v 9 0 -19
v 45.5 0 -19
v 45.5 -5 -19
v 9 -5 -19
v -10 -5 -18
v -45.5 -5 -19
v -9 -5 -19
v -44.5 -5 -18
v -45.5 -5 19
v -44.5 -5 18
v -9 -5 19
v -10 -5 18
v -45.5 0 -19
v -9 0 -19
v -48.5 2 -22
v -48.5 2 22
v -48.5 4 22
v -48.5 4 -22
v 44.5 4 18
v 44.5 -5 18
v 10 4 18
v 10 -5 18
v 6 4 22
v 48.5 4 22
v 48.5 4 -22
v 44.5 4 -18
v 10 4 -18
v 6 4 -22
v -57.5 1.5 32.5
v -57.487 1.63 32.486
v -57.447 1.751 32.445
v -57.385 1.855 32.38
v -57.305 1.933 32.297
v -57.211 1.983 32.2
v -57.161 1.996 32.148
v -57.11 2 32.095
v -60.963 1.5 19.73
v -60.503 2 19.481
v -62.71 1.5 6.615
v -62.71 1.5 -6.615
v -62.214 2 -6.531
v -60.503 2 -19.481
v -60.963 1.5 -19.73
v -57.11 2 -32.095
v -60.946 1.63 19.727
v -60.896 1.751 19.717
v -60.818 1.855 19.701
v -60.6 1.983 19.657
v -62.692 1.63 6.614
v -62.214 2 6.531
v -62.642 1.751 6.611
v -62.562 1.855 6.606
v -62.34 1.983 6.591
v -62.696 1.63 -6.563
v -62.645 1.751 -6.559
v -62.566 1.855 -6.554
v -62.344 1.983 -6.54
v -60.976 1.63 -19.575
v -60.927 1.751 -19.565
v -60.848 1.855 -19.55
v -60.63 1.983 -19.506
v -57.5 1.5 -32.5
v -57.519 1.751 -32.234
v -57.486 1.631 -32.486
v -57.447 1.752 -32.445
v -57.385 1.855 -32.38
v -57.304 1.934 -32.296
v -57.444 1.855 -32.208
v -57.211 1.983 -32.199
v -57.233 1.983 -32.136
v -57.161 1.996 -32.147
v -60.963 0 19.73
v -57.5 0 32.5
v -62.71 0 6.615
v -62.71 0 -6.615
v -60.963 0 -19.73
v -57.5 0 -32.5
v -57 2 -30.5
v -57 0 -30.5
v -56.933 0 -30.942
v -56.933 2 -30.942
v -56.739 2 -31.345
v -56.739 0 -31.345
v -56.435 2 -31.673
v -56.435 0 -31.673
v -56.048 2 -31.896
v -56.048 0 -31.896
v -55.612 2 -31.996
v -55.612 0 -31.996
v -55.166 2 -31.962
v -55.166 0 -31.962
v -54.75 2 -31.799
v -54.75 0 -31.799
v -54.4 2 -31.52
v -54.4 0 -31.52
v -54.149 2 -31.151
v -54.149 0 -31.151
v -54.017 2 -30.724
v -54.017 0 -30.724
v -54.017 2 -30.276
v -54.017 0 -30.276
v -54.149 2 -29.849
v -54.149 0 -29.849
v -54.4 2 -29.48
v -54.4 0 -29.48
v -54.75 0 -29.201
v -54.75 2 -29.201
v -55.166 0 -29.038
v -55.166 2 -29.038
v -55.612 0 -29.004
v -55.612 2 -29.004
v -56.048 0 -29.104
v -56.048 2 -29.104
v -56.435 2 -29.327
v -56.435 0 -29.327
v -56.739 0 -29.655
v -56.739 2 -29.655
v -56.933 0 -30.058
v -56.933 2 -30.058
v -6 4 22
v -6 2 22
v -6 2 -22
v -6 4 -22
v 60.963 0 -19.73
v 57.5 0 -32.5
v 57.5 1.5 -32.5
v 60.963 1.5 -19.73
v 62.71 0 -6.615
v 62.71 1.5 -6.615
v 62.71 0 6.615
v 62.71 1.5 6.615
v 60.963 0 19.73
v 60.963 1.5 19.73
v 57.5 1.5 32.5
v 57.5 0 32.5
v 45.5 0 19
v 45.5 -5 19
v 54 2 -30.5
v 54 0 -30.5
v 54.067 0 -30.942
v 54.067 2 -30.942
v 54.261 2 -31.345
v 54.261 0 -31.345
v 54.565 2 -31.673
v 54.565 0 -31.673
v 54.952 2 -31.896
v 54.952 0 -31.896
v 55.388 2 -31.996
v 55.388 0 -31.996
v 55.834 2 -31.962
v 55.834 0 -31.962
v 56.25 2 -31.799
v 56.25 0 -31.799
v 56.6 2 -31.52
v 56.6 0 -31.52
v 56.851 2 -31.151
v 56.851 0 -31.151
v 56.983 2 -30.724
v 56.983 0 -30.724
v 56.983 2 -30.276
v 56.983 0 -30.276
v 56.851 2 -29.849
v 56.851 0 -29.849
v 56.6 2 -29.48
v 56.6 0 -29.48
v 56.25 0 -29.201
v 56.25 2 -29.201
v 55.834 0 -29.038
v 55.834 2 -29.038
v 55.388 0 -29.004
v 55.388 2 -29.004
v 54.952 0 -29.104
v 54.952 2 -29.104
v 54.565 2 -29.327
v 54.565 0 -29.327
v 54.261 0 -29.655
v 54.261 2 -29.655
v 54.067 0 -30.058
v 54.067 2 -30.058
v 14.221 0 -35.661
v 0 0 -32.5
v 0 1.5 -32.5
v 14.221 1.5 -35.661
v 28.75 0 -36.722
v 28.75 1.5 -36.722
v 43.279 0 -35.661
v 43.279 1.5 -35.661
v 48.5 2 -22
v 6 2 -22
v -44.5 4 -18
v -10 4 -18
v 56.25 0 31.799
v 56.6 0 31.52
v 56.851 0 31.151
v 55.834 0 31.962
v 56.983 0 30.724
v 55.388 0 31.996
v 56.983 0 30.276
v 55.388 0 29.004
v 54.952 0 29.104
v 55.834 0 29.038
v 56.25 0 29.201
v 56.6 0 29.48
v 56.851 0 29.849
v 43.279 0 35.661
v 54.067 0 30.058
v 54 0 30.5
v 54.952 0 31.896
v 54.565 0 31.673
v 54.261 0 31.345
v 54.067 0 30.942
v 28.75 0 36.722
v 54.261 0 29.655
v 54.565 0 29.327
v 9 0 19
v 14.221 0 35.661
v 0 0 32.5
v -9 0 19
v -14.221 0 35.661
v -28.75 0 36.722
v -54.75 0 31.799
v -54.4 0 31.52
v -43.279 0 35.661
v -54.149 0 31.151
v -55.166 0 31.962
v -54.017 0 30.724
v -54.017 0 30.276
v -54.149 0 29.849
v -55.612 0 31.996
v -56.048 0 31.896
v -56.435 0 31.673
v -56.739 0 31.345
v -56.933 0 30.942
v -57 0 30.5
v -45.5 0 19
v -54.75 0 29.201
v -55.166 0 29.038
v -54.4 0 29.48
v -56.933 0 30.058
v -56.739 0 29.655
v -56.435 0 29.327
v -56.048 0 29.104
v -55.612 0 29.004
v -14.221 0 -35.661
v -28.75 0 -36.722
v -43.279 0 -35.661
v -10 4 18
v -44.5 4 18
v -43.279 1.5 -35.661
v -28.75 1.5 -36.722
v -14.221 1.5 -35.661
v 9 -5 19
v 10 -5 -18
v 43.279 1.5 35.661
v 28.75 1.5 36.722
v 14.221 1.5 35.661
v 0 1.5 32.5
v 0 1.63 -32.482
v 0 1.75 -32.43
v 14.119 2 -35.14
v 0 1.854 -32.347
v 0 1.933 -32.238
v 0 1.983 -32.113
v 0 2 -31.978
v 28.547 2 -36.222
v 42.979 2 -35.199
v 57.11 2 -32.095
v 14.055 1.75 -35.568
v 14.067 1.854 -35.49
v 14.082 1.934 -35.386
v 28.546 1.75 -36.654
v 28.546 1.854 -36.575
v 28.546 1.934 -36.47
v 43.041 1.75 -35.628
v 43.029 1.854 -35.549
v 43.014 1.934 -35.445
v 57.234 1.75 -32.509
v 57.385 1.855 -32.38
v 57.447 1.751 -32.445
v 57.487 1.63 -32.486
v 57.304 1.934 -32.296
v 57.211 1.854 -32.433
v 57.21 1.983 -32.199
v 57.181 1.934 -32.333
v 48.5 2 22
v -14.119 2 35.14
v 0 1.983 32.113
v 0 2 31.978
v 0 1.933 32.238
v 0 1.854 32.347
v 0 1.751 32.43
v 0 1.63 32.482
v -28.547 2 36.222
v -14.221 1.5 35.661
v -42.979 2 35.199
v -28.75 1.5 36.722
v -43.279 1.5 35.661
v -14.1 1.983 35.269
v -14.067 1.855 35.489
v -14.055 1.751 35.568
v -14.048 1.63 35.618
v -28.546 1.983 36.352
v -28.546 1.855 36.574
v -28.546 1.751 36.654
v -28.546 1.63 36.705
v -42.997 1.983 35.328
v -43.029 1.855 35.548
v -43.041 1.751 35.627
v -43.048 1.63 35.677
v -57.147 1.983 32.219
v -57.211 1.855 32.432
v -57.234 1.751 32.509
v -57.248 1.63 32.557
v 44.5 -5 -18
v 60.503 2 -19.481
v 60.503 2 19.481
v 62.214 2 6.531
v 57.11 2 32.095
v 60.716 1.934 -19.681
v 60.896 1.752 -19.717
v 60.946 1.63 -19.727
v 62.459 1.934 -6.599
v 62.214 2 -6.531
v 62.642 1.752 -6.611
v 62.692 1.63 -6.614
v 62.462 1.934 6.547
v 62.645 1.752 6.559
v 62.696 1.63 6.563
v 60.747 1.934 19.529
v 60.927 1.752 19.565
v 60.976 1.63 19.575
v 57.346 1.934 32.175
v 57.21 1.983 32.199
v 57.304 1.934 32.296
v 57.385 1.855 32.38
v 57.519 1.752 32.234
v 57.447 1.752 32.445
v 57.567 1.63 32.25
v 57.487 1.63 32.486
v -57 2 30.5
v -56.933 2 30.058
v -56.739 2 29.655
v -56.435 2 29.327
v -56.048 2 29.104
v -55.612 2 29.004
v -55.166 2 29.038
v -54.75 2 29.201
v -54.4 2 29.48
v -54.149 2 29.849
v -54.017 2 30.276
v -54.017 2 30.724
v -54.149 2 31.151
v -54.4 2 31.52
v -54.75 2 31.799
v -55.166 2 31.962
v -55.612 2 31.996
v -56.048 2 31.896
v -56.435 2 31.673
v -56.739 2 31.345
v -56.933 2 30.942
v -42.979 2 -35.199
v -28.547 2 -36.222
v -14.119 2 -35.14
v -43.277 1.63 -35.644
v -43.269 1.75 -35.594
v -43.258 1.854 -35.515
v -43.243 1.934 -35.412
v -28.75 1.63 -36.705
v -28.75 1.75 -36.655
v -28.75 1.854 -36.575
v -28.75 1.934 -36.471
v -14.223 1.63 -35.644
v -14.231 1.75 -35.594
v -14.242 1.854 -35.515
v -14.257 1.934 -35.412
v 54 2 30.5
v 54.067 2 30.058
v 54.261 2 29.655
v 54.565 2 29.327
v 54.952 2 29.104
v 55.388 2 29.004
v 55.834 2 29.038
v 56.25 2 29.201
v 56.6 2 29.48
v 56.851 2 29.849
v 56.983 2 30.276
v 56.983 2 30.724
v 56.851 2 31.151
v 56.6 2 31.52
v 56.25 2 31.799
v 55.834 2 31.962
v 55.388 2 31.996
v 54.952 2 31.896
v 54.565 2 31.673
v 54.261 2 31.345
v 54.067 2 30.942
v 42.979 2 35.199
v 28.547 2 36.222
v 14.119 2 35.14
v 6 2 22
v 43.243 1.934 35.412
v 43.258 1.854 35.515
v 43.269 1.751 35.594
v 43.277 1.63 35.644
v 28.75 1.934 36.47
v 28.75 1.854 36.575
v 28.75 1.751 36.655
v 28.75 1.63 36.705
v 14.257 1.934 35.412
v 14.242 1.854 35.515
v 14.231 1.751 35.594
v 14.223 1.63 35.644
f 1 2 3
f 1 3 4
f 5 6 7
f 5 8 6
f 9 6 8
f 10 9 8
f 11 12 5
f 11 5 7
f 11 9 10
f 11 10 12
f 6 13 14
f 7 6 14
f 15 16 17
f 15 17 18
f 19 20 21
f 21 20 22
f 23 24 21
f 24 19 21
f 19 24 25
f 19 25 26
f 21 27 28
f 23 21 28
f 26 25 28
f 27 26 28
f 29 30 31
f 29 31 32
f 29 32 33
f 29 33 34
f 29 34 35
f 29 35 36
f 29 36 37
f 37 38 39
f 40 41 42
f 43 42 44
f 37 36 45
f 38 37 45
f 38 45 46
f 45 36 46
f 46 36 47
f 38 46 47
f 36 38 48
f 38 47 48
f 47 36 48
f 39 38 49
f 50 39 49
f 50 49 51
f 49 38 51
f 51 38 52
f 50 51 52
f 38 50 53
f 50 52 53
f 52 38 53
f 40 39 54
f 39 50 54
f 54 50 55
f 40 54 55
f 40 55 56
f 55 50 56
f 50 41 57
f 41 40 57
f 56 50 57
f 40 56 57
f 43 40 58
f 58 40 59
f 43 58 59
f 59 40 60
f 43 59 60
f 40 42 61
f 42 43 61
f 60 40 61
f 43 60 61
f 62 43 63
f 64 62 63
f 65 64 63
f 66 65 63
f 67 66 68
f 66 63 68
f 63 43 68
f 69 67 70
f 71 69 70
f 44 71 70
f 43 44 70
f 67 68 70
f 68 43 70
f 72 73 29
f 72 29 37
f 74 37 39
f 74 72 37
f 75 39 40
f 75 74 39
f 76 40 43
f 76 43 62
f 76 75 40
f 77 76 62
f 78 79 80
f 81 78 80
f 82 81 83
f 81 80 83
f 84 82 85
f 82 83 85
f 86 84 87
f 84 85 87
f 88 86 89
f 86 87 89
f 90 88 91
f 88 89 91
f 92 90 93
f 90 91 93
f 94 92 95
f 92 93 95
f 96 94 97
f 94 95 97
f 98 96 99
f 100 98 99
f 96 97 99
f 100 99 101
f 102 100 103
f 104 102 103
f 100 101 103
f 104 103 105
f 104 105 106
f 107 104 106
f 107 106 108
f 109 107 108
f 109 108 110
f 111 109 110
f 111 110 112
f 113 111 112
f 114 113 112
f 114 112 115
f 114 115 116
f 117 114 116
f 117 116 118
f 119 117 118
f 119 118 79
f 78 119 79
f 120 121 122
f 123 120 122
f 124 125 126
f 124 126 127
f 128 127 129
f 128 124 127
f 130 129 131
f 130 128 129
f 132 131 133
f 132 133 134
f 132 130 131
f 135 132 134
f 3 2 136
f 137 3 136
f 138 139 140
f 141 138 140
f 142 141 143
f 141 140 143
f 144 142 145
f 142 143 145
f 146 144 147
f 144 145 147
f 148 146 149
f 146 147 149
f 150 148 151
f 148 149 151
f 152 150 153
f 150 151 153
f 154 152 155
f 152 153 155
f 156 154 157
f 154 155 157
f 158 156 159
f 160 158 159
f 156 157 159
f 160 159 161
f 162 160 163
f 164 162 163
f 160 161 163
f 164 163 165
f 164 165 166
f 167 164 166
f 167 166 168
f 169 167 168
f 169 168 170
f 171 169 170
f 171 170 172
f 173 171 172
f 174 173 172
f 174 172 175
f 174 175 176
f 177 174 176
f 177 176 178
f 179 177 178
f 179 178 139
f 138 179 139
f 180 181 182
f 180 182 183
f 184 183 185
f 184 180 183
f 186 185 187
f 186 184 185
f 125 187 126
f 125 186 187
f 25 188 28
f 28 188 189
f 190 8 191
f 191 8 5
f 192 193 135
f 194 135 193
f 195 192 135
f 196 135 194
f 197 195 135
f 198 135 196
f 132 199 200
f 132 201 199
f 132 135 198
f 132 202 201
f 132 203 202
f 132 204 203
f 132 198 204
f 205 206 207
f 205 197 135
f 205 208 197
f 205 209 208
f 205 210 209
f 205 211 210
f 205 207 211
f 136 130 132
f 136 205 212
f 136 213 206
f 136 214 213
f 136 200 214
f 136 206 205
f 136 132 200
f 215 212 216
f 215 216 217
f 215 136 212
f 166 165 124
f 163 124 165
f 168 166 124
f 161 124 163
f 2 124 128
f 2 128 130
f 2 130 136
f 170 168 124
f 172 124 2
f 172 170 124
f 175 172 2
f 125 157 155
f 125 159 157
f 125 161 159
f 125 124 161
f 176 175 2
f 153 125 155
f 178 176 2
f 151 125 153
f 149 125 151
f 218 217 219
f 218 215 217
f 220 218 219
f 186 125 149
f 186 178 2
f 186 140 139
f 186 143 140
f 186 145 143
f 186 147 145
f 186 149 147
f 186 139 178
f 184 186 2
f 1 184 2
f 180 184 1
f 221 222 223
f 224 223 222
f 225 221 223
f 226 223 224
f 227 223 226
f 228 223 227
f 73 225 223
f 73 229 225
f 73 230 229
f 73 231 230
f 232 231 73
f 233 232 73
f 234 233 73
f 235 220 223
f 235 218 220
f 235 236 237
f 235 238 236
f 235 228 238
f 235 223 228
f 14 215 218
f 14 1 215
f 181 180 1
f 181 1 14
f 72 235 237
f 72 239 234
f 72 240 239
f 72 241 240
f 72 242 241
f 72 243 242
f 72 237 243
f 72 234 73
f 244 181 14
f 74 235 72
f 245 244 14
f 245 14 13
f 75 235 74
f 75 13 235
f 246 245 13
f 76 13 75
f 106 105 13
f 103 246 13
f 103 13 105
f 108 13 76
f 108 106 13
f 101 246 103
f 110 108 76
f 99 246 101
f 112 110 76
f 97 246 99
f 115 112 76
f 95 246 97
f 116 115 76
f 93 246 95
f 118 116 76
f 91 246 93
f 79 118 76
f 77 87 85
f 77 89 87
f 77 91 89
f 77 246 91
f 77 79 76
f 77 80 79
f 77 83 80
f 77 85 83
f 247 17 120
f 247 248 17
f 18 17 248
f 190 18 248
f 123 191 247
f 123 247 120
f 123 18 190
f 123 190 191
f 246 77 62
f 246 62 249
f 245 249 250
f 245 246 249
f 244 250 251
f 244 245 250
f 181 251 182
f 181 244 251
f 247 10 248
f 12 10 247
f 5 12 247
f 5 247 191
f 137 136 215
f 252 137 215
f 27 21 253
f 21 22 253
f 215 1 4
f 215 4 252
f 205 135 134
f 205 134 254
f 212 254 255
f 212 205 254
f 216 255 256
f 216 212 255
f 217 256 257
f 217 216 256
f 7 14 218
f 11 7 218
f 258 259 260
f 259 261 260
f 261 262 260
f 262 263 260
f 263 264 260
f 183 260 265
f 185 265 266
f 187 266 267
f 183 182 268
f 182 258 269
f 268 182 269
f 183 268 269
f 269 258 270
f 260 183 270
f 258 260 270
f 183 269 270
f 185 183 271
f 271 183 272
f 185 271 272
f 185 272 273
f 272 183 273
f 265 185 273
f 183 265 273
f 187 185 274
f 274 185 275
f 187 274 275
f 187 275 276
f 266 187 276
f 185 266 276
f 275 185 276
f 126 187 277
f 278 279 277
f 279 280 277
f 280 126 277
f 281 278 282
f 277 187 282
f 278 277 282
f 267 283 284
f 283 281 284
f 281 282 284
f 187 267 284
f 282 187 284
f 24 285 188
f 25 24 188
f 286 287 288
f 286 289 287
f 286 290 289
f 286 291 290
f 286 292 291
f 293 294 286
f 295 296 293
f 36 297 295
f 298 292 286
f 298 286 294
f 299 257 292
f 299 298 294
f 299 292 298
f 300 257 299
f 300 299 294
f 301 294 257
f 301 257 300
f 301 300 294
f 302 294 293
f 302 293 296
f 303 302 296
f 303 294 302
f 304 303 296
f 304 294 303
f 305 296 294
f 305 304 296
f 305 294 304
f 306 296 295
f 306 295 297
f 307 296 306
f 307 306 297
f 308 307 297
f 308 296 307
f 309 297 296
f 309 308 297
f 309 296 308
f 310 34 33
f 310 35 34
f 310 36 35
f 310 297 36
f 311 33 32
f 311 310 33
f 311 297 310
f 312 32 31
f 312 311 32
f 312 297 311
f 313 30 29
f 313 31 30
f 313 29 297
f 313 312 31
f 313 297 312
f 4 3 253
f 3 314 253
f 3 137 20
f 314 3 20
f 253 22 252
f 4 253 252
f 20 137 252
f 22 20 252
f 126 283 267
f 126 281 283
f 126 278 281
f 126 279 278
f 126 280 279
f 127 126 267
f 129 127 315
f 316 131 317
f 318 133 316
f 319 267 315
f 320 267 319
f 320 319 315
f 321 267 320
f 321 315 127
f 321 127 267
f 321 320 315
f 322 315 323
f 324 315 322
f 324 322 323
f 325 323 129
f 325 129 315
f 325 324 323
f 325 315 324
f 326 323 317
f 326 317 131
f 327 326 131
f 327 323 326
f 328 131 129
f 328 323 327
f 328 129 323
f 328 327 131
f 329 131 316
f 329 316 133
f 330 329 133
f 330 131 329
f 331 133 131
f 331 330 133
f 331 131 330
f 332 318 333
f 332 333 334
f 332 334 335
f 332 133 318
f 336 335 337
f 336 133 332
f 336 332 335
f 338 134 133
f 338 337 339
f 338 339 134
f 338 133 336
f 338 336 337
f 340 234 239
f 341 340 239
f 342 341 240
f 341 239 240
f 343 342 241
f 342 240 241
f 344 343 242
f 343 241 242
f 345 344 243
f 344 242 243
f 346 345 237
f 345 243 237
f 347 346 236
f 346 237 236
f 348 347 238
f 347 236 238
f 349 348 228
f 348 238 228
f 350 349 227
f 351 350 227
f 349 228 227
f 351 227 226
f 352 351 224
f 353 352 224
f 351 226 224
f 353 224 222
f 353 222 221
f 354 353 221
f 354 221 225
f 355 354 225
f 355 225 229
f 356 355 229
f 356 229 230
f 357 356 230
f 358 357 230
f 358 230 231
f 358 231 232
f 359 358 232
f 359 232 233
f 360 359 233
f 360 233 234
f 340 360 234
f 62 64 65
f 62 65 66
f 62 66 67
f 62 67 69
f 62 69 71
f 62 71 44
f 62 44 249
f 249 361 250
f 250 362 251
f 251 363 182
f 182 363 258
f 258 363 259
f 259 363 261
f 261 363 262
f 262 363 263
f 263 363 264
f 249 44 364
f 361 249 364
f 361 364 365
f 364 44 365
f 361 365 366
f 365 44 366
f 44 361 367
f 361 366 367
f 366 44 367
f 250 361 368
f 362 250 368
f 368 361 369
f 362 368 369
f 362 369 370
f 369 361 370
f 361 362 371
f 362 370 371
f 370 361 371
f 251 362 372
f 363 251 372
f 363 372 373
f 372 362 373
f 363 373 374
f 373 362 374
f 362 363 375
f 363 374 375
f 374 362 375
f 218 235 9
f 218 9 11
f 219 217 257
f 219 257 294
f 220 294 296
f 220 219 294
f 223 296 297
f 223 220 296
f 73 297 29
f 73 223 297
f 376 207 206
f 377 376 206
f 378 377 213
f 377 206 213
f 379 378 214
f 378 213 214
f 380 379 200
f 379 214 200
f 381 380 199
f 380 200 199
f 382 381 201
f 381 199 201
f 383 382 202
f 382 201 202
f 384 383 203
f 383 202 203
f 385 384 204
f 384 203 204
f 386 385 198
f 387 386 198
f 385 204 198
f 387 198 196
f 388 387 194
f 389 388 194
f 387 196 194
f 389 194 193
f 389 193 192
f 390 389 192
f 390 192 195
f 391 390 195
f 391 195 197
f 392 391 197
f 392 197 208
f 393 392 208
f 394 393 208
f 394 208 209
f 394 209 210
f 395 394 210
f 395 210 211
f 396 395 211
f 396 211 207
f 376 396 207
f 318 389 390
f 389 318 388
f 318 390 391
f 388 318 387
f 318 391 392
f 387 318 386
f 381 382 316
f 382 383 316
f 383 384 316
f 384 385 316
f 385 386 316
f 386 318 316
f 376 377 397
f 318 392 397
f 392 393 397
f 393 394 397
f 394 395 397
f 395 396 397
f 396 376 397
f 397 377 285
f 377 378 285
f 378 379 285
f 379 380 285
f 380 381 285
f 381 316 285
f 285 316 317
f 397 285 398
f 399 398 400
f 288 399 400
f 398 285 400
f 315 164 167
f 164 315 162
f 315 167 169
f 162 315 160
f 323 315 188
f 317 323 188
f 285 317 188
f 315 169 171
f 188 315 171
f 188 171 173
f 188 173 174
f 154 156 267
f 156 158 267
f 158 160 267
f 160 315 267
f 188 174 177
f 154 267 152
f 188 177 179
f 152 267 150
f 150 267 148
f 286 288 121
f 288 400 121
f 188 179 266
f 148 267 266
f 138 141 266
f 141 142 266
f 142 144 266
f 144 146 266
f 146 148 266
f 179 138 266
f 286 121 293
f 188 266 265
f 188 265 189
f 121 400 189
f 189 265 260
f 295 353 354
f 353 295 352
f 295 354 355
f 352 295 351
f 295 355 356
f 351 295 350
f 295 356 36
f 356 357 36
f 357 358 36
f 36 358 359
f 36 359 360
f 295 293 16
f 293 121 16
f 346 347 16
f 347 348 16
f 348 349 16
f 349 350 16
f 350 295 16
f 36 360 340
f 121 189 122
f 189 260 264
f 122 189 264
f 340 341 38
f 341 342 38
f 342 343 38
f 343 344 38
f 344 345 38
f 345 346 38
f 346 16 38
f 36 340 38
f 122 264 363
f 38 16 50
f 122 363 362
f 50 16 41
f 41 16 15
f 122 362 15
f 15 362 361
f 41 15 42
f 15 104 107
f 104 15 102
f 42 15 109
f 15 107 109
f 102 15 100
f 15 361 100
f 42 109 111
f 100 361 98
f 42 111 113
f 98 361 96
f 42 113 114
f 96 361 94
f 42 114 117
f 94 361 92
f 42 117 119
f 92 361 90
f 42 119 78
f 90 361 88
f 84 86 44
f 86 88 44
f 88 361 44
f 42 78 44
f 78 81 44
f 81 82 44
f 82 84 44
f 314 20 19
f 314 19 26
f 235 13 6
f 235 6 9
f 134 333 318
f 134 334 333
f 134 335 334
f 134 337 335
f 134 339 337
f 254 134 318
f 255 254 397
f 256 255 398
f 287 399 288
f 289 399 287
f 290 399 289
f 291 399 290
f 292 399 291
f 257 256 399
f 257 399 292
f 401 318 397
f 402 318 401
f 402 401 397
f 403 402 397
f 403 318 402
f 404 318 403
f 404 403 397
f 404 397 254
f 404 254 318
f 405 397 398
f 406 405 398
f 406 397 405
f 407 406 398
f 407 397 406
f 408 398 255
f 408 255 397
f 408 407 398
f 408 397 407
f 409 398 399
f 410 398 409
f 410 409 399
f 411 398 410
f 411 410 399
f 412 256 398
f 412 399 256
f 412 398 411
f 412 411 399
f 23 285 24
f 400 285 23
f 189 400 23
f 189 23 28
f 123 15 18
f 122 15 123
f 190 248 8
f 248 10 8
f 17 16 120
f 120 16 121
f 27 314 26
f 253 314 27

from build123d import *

# Parameters (mm, degrees)
BOSS_EXTRUDE1_DEPTH = 2
HOLE1_D             = 3
HOLE1_DEPTH         = 10
FILLET1_R           = 0.5
SKETCH7_W           = 34.5
SKETCH7_H           = 36
CUT_EXTRUDE1_DEPTH  = 2
SKETCH9_W           = 36.5
SKETCH9_H           = 38
SKETCH9_W_2         = 34.5
SKETCH9_H_2         = 36
BOSS_EXTRUDE2_DEPTH = 5
SKETCH10_W          = 42.5
SKETCH10_H          = 44
SKETCH10_W_2        = 34.5
SKETCH10_H_2        = 36
BOSS_EXTRUDE3_DEPTH = 2


with BuildPart() as part:
    # Sketch2 → Boss-Extrude1 (new body)
    with BuildSketch(Plane(origin=(0, 0, 0), x_dir=(1, 0, 0), z_dir=(0, 1, 0))):
        with BuildLine():
            ThreePointArc((-57.5, 32.5), (-28.75, 36.721936228), (0, 32.5))
            ThreePointArc((0, 32.5), (28.75, 36.721936228), (57.5, 32.5))
            ThreePointArc((57.5, 32.5), (62.928598403, 0), (57.5, -32.5))
            ThreePointArc((57.5, -32.5), (28.75, -36.721936228), (0, -32.5))
            ThreePointArc((0, -32.5), (-28.75, -36.721936228), (-57.5, -32.5))
            ThreePointArc((-57.5, -32.5), (-62.928598403, 0), (-57.5, 32.5))
        make_face()
    extrude(amount=BOSS_EXTRUDE1_DEPTH)

    # Hole1
    with Locations(Plane(origin=(0, 2, 0), x_dir=(1, 0, 0), z_dir=(0, 1, 0))):
        with Locations((-55.5, 30.5), (55.5, 30.5), (55.5, -30.5), (-55.5, -30.5)):
            Hole(HOLE1_D / 2, depth=HOLE1_DEPTH)

    # Fillet1
    fillet1_edges = [part.edges().sort_by_distance(p)[0] for p in [
        (28.75, 2, 36.721936228),
        (62.928598403, 2, 0),
        (28.75, 2, -36.721936228),
        (-28.75, 2, -36.721936228),
        (-62.928598403, 2, 0),
        (-28.75, 2, 36.721936228),
    ]]
    fillet(fillet1_edges, radius=FILLET1_R)

    # Sketch7 → Cut-Extrude1 (cut)
    with BuildSketch(Plane(origin=(0, 2, 0), x_dir=(1, 0, 0), z_dir=(0, 1, 0))):
        with Locations((-27.25, 0)):
            Rectangle(SKETCH7_W, SKETCH7_H)
    cut_extrude1 = extrude(amount=-CUT_EXTRUDE1_DEPTH, mode=Mode.SUBTRACT)

    # Sketch9 → Boss-Extrude2 (add)
    with BuildSketch(Plane.XZ):
        with Locations((-27.25, 0)):
            Rectangle(SKETCH9_W, SKETCH9_H)
        with Locations((-27.25, 0)):
            Rectangle(SKETCH9_W_2, SKETCH9_H_2, mode=Mode.SUBTRACT)
    boss_extrude2 = extrude(amount=BOSS_EXTRUDE2_DEPTH)

    # Sketch10 → Boss-Extrude3 (add)
    with BuildSketch(Plane(origin=(0, 2, 0), x_dir=(1, 0, 0), z_dir=(0, 1, 0))):
        with Locations((-27.25, 0)):
            Rectangle(SKETCH10_W, SKETCH10_H)
        with Locations((-27.25, 0)):
            Rectangle(SKETCH10_W_2, SKETCH10_H_2, mode=Mode.SUBTRACT)
    boss_extrude3 = extrude(amount=BOSS_EXTRUDE3_DEPTH)

    # Mirror1: Cut-Extrude1, Boss-Extrude2, Boss-Extrude3 across plane
    add(cut_extrude1.mirror(Plane(origin=(0, 0, 0), x_dir=(0, 0, 1), z_dir=(1, 0, 0))), mode=Mode.SUBTRACT)
    add(boss_extrude2.mirror(Plane(origin=(0, 0, 0), x_dir=(0, 0, 1), z_dir=(1, 0, 0))))
    add(boss_extrude3.mirror(Plane(origin=(0, 0, 0), x_dir=(0, 0, 1), z_dir=(1, 0, 0))))


solid = part.part
